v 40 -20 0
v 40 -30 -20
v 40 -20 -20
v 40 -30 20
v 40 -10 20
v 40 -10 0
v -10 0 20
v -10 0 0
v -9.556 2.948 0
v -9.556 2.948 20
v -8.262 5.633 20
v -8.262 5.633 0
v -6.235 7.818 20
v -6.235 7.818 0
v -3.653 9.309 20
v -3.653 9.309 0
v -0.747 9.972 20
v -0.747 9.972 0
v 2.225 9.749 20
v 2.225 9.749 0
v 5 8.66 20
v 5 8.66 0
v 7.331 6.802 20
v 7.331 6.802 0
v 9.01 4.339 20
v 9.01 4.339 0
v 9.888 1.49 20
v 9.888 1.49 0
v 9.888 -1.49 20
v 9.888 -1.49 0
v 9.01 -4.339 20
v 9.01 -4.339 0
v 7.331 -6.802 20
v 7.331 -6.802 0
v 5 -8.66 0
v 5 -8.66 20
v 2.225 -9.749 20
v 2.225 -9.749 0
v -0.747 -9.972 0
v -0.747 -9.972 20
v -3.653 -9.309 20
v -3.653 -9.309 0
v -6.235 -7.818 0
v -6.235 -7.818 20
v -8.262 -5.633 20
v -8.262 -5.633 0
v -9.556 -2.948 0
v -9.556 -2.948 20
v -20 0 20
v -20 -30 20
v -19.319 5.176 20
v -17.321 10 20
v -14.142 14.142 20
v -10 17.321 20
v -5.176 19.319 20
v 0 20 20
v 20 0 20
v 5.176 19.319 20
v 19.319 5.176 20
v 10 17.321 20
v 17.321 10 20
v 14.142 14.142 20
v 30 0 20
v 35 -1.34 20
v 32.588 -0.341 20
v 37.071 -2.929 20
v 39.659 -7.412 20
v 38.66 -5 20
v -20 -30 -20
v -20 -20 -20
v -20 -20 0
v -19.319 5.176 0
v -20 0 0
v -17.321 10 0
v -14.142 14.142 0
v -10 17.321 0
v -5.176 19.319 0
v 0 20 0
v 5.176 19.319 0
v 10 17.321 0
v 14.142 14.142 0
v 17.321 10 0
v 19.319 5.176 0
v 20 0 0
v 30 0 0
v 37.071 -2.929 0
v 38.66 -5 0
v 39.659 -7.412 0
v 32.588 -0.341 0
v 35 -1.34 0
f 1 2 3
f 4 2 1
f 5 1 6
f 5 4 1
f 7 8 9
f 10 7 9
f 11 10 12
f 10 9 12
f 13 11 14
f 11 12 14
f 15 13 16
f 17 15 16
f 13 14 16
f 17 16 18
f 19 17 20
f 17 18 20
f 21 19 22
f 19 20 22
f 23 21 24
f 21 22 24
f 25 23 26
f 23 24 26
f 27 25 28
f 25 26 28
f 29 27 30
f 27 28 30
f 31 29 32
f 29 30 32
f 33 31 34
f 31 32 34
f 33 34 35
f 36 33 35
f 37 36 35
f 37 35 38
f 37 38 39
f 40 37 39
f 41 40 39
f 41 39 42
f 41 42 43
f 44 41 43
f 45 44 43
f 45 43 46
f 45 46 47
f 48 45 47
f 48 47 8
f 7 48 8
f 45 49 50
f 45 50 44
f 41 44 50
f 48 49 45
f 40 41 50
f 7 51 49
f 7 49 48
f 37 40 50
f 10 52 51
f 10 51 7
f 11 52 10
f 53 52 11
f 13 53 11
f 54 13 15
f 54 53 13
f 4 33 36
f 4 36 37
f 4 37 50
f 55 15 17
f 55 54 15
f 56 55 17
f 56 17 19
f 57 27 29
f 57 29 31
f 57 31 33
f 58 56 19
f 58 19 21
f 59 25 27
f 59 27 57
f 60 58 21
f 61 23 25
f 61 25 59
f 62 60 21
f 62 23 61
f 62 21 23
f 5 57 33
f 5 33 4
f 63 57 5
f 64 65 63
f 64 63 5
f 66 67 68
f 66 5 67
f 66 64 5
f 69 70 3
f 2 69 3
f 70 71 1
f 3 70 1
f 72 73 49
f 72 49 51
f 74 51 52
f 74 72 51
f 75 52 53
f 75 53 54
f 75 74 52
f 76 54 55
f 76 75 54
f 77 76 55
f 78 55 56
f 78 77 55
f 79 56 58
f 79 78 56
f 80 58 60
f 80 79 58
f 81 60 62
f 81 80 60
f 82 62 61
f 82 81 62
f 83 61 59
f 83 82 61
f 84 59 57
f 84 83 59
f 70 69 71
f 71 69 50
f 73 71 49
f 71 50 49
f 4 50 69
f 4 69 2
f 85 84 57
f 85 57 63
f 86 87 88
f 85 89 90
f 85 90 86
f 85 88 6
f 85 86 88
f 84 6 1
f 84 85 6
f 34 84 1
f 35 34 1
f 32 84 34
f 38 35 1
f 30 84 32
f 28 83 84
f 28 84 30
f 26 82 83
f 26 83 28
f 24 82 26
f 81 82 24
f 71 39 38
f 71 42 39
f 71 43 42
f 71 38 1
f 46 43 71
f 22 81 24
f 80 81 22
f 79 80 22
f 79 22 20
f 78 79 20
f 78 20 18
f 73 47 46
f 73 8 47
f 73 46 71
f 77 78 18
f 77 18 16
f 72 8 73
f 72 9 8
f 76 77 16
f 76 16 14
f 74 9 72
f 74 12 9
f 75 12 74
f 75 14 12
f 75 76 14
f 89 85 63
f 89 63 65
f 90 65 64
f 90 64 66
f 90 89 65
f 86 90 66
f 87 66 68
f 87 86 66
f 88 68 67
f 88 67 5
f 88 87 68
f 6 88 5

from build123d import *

# Parameters (mm, degrees)
BOSS_EXTRUDE4_DEPTH = 20
SKETCH6_W           = 60
SKETCH6_H           = 10
BOSS_EXTRUDE6_DEPTH = 40
SKETCH7_R           = 10
CUT_EXTRUDE2_DEPTH  = 40


with BuildPart() as part:
    # Sketch1 → Boss-Extrude4 (new body)
    with BuildSketch(Plane.XY):
        with BuildLine():
            Line((20, 0), (30, 0))
            ThreePointArc((30, 0), (37.071067812, -2.928932188), (40, -10))
            Line((40, -10), (40, -20))
            Line((40, -20), (-20, -20))
            Line((-20, -20), (-20, 0))
            ThreePointArc((-20, 0), (0, 20), (20, 0))
        make_face()
    extrude(amount=BOSS_EXTRUDE4_DEPTH)

    # Sketch6 → Boss-Extrude6 (add)
    with BuildSketch(Plane.XY.offset(20)):
        with Locations((10, -25)):
            Rectangle(SKETCH6_W, SKETCH6_H)
    extrude(amount=-BOSS_EXTRUDE6_DEPTH)

    # Sketch7 → Cut-Extrude2 (cut)
    with BuildSketch(Plane(origin=(0, 0, 0), x_dir=(-1, 0, 0), z_dir=(0, 0, -1))):
        Circle(SKETCH7_R)
    extrude(amount=-CUT_EXTRUDE2_DEPTH, mode=Mode.SUBTRACT)


solid = part.part
